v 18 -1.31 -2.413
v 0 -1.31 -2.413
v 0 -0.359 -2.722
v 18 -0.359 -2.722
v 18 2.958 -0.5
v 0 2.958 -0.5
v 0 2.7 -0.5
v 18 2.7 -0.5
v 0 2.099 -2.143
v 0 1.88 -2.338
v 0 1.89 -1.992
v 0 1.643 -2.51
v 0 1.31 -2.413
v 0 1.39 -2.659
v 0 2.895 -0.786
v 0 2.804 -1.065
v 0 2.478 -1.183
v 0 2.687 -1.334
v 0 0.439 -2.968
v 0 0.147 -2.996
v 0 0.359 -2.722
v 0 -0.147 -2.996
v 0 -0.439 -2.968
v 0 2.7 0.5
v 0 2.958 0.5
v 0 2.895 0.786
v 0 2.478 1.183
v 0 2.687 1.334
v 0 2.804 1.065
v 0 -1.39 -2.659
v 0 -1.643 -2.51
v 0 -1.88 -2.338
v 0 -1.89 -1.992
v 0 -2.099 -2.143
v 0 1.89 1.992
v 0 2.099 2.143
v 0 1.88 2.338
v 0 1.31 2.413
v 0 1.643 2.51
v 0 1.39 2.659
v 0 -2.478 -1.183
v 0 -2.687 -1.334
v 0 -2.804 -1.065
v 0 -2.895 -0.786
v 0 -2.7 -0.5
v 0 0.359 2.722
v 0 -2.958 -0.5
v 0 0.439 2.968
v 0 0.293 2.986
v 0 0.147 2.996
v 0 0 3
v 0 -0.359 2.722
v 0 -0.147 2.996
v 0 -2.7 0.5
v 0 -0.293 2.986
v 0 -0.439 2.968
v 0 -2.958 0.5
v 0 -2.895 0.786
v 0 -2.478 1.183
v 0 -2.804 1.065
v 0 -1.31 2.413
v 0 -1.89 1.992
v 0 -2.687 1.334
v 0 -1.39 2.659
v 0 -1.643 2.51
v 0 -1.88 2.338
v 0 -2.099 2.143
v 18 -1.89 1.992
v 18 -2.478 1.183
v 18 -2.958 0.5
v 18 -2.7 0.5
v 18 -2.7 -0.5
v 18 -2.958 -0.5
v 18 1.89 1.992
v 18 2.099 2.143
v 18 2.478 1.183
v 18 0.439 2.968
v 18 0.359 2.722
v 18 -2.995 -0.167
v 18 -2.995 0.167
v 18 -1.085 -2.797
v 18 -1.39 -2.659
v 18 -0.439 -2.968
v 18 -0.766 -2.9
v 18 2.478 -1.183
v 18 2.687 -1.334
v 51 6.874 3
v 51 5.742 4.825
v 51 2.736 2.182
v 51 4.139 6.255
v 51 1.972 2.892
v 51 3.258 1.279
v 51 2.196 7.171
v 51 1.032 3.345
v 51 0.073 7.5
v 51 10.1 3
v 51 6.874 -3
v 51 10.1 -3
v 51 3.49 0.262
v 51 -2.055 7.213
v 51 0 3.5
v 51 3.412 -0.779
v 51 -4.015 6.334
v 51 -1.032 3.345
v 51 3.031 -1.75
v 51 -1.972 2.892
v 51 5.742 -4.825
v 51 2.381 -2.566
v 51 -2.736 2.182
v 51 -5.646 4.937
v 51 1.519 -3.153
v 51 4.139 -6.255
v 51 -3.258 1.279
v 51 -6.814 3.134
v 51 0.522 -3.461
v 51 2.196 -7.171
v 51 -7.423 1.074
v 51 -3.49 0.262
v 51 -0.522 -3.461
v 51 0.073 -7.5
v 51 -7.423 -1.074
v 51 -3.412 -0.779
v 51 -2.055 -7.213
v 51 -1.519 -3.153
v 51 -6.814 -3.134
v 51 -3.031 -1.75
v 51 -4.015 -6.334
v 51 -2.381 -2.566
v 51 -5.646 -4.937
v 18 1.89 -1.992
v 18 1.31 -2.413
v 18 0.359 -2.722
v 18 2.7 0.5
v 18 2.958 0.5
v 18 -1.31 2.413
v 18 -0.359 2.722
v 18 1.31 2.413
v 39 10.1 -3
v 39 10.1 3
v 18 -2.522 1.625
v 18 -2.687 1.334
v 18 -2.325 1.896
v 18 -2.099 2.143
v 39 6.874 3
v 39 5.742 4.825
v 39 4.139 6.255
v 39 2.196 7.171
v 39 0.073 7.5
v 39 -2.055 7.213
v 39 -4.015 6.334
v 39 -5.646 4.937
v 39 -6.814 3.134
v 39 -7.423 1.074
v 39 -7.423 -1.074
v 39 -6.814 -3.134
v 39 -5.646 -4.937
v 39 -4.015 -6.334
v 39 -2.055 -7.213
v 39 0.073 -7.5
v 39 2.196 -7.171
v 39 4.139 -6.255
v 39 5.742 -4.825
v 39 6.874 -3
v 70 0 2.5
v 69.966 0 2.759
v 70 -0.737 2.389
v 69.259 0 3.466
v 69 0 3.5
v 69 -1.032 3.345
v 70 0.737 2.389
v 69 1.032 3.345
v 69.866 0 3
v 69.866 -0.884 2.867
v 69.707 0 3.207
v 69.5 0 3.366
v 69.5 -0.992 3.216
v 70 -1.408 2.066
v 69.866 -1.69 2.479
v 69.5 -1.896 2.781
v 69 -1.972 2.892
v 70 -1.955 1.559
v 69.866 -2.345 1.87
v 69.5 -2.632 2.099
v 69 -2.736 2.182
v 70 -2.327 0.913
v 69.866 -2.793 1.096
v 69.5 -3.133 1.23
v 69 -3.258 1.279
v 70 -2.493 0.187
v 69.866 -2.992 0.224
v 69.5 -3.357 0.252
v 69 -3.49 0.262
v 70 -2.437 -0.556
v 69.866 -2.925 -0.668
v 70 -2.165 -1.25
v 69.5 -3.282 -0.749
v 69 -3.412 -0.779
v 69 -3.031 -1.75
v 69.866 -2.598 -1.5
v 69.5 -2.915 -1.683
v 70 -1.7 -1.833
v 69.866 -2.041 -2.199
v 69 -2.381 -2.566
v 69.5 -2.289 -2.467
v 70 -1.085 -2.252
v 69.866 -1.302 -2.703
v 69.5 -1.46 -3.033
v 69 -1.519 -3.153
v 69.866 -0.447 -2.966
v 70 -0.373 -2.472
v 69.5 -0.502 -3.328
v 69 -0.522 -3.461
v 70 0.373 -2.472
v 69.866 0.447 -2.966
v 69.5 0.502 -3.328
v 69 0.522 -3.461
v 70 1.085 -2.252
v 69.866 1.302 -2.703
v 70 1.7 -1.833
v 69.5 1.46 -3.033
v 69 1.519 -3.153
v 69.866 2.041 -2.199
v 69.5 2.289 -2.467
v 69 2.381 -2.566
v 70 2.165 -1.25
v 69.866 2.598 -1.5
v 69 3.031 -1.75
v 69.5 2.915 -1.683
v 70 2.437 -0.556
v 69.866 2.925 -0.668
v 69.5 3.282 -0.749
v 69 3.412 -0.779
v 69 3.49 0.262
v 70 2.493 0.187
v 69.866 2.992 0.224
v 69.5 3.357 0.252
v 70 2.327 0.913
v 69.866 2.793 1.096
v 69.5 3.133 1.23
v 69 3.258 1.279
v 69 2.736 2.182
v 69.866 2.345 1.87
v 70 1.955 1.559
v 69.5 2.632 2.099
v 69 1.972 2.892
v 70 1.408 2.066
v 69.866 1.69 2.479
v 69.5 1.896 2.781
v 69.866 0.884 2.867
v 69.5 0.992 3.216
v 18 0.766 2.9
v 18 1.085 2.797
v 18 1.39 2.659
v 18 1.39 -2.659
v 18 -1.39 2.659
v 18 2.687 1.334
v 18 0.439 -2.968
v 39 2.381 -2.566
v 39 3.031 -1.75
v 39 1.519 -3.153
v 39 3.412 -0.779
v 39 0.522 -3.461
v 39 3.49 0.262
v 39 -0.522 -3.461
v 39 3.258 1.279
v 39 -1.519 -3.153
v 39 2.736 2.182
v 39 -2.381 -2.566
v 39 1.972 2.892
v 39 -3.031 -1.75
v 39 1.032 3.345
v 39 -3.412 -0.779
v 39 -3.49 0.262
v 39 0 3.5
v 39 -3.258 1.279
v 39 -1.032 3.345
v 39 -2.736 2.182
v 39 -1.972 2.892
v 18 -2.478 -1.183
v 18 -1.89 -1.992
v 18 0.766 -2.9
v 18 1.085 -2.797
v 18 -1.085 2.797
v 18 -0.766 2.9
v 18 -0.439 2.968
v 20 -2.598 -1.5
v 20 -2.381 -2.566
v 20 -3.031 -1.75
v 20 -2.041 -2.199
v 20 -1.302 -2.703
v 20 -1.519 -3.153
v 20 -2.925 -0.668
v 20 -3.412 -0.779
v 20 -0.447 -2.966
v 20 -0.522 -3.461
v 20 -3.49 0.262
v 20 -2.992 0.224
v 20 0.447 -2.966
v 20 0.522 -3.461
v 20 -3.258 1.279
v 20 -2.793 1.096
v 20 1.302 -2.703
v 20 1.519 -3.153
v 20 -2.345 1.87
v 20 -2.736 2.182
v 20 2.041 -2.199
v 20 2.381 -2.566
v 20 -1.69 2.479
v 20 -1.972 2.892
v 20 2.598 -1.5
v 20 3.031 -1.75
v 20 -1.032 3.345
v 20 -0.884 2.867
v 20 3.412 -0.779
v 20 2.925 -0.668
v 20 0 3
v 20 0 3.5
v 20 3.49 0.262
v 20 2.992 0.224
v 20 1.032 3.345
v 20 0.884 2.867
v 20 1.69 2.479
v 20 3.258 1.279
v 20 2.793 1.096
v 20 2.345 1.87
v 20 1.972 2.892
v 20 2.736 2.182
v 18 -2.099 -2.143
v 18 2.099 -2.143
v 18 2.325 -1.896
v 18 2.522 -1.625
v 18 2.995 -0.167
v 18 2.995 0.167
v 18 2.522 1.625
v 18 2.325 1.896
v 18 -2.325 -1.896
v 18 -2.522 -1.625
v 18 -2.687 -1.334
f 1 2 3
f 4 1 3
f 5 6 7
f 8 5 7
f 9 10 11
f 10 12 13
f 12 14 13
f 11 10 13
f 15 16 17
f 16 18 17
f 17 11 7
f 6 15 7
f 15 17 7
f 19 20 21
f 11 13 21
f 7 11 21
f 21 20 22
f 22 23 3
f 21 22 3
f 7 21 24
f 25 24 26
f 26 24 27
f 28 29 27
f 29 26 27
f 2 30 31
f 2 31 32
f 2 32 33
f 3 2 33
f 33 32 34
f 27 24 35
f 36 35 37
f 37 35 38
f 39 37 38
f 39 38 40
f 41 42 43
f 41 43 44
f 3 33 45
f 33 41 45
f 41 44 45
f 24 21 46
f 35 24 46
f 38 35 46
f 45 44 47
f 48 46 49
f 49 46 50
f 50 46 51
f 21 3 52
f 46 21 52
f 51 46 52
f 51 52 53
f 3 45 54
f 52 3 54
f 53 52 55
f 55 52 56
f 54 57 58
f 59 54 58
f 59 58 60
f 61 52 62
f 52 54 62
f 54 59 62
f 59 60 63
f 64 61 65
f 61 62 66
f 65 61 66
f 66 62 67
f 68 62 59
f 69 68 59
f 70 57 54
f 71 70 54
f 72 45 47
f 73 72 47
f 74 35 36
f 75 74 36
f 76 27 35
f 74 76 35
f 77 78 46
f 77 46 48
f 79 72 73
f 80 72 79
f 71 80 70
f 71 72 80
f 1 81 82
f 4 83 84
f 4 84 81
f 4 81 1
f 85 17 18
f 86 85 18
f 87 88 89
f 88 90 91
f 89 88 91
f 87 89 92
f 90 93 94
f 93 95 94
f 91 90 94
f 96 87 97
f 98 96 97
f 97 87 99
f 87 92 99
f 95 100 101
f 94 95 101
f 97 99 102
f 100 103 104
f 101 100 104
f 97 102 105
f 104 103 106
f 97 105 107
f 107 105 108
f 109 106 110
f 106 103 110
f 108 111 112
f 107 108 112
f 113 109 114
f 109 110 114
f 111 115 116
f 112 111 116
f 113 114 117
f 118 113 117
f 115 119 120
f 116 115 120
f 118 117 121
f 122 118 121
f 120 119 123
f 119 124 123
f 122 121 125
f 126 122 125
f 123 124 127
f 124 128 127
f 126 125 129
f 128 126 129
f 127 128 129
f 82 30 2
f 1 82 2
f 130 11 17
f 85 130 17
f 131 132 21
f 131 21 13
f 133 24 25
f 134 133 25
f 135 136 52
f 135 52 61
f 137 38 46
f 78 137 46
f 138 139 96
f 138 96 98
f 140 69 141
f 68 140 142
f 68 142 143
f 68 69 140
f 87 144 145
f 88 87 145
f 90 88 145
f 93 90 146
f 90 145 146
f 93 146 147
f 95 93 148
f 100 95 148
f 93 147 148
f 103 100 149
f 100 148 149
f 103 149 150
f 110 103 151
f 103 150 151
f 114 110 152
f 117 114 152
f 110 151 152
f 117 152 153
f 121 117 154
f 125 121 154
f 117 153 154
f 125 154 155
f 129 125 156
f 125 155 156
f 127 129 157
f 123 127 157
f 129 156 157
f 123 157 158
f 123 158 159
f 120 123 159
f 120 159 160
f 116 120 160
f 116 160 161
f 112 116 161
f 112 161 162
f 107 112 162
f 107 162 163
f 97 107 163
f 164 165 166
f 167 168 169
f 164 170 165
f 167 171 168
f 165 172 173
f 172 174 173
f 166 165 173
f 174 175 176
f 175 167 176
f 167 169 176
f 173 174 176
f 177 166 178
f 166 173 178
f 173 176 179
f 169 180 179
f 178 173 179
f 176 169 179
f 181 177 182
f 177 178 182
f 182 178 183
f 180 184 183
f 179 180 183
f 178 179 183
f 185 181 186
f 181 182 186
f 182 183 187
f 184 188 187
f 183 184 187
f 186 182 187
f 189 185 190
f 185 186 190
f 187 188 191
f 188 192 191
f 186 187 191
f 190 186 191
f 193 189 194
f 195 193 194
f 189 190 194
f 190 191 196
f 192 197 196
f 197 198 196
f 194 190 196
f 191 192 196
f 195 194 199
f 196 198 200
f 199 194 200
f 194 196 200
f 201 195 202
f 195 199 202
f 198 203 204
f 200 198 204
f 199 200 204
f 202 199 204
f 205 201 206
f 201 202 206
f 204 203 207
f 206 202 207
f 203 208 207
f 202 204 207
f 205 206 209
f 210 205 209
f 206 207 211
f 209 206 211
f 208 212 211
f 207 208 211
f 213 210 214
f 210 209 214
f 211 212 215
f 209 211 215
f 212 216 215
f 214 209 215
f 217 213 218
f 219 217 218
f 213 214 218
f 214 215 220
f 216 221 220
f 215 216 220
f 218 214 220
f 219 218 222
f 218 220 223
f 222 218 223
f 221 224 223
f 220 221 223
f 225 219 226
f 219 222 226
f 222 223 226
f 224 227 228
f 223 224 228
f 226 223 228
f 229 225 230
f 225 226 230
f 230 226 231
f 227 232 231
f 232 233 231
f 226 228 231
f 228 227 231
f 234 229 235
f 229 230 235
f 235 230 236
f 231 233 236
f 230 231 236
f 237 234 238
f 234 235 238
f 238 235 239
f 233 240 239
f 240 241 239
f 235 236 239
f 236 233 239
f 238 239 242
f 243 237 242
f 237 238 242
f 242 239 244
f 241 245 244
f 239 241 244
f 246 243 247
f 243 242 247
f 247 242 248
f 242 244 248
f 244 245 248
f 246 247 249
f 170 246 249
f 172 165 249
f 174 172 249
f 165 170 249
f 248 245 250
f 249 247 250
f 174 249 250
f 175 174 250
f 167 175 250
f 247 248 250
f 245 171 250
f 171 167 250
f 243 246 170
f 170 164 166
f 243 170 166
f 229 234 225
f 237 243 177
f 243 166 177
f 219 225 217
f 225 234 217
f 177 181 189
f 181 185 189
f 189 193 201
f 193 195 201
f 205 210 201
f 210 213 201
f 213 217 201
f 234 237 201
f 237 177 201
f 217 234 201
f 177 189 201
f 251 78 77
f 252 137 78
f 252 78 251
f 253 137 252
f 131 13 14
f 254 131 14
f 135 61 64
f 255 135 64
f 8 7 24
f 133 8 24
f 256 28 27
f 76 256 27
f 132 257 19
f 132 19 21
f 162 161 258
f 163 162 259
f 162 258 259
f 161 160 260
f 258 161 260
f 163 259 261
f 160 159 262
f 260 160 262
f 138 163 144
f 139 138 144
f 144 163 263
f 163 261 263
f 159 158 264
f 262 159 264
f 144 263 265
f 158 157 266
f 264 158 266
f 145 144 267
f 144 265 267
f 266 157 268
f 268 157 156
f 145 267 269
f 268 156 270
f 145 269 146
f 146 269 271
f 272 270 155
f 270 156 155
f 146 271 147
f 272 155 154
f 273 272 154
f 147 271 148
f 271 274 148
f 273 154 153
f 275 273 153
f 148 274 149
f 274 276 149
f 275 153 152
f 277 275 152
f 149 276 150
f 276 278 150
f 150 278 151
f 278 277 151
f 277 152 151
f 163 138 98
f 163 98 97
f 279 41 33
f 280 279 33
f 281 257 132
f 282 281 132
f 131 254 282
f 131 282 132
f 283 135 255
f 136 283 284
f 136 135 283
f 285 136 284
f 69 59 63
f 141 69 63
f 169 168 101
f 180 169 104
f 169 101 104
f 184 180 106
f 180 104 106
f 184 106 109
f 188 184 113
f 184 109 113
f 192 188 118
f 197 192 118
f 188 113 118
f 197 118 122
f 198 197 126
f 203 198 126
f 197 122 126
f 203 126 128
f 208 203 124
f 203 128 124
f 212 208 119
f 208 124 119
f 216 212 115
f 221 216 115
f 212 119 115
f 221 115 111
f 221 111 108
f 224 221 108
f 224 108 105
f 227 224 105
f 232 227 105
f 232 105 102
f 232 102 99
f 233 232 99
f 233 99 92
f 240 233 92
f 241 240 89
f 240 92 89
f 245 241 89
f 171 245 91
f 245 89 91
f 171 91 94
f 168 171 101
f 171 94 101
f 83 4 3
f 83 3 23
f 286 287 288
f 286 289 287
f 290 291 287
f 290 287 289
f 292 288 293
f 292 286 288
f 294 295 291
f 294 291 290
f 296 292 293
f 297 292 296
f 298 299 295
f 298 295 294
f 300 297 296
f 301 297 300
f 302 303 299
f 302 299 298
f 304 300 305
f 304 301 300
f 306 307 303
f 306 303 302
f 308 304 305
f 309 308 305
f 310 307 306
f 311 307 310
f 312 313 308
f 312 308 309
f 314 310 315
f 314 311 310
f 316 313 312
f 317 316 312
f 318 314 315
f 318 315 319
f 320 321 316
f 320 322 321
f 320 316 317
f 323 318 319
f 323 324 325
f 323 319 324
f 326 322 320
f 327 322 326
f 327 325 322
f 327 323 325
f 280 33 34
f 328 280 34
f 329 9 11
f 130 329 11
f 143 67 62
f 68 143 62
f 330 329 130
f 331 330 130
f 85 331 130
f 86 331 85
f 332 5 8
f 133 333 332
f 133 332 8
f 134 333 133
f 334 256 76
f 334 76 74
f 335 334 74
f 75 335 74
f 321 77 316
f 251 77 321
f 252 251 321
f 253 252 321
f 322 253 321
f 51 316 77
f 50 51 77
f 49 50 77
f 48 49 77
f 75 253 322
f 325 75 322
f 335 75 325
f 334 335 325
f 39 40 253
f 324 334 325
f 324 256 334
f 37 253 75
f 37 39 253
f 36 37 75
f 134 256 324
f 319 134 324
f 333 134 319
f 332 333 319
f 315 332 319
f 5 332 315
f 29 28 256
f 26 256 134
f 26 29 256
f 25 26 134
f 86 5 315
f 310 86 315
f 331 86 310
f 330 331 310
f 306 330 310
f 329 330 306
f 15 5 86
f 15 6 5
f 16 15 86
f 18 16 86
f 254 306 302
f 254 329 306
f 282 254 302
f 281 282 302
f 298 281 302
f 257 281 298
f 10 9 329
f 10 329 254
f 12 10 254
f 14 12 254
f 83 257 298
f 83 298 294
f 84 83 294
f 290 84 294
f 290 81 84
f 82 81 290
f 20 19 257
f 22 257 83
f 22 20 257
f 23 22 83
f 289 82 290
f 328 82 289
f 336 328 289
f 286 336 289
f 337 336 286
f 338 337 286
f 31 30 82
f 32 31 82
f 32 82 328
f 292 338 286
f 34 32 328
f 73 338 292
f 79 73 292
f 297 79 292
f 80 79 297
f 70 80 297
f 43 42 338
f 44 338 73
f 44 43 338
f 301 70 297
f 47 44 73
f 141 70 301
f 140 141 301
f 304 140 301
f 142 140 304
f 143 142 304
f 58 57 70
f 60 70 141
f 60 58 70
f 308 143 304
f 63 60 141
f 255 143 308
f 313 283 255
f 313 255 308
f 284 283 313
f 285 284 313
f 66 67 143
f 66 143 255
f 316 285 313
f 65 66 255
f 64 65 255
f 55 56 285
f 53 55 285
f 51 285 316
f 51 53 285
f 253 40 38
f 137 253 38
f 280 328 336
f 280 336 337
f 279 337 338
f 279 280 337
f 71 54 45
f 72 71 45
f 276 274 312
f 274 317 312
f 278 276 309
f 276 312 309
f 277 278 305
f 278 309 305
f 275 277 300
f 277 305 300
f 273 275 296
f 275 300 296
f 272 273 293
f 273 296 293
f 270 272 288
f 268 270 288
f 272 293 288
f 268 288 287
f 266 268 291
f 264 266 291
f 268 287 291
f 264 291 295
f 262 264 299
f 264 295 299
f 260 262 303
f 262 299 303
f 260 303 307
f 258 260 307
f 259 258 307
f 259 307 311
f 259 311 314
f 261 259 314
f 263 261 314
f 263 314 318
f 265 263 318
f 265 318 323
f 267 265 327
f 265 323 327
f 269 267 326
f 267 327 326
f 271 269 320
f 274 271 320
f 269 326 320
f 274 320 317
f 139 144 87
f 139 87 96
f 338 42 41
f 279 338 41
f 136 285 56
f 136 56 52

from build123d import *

# Parameters (mm, degrees)
Y_KSEKLIK_EKSTR_ZYON2_START = -12
Y_KSEKLIK_EKSTR_ZYON2_DEPTH = 12
KES_EKSTR_ZYON1_DEPTH       = 18
IZIM4_R                     = 3.5
IZIM4_R_2                   = 3
KES_EKSTR_ZYON2_DEPTH       = 20


with BuildPart() as part:
    # Çizim1 → Döndür1 (revolve)
    with BuildSketch(Plane.XY, mode=Mode.PRIVATE) as d_nd_r1_sk:
        with BuildLine():
            Line((0, 0), (70, 0))
            Line((70, 0), (70, 2.5))
            ThreePointArc((70, 2.5), (69.707106781, 3.207106781), (69, 3.5))
            Line((69, 3.5), (51, 3.5))
            Line((51, 3.5), (51, 7.5))
            Line((51, 7.5), (39, 7.5))
            Line((39, 7.5), (39, 3.5))
            Line((39, 3.5), (0, 3.5))
            Line((0, 3.5), (0, 0))
        make_face()
    revolve(d_nd_r1_sk.sketch.rotate(Axis((0, 0, 0), (1, 0, 0)), 90), axis=Axis((0, 0, 0), (1, 0, 0)))

    # Çizim2 → Yükseklik-Ekstrüzyon2 (add)
    with BuildSketch(Plane(origin=(51, 0, 0), x_dir=(0, 0, -1), z_dir=(1, 0, 0)).offset(Y_KSEKLIK_EKSTR_ZYON2_START)):
        with BuildLine():
            Line((-3, 10.1), (3, 10.1))
            Line((3, 10.1), (3, 6.873863542))
            ThreePointArc((3, 6.873863542), (0, 7.5), (-3, 6.873863542))
            Line((-3, 6.873863542), (-3, 10.1))
        make_face()
    extrude(amount=Y_KSEKLIK_EKSTR_ZYON2_DEPTH)

    # Çizim3 → Kes-Ekstrüzyon1 (cut)
    with BuildSketch(Plane.ZY):
        with BuildLine():
            Line((1.182511684, 2.478238511), (1.991528678, 1.890453259))
            Line((1.991528678, 1.890453259), (2.440656339, 2.508624451))
            ThreePointArc((2.440656339, 2.508624451), (2.057248383, 2.83155948), (1.631639345, 3.096409703))
            Line((1.631639345, 3.096409703), (1.182511684, 2.478238511))
        make_face()
        with BuildLine():
            Line((-0.5, 3.464101615), (-0.5, 2.7))
            Line((-0.5, 2.7), (0.5, 2.7))
            Line((0.5, 2.7), (0.5, 3.464101615))
            ThreePointArc((0.5, 3.464101615), (0, 3.5), (-0.5, 3.464101615))
        make_face()
        with BuildLine():
            Line((2.413344097, 1.309874143), (2.722361091, 0.358817627))
            Line((2.722361091, 0.358817627), (3.449064911, 0.594938011))
            ThreePointArc((3.449064911, 0.594938011), (3.328697807, 1.08155948), (3.140047917, 1.545994527))
            Line((3.140047917, 1.545994527), (2.413344097, 1.309874143))
        make_face()
        with BuildLine():
            Line((2.722361091, -0.358817627), (2.413344097, -1.309874143))
            Line((2.413344097, -1.309874143), (3.140047917, -1.545994527))
            ThreePointArc((3.140047917, -1.545994527), (3.328697807, -1.08155948), (3.449064911, -0.594938011))
            Line((3.449064911, -0.594938011), (2.722361091, -0.358817627))
        make_face()
        with BuildLine():
            Line((1.991528678, -1.890453259), (1.182511684, -2.478238511))
            Line((1.182511684, -2.478238511), (1.631639345, -3.096409703))
            ThreePointArc((1.631639345, -3.096409703), (2.057248383, -2.83155948), (2.440656339, -2.508624451))
            Line((2.440656339, -2.508624451), (1.991528678, -1.890453259))
        make_face()
        with BuildLine():
            Line((0.5, -2.7), (-0.5, -2.7))
            Line((-0.5, -2.7), (-0.5, -3.464101615))
            ThreePointArc((-0.5, -3.464101615), (0, -3.5), (0.5, -3.464101615))
            Line((0.5, -3.464101615), (0.5, -2.7))
        make_face()
        with BuildLine():
            Line((-1.182511684, -2.478238511), (-1.991528678, -1.890453259))
            Line((-1.991528678, -1.890453259), (-2.440656339, -2.508624451))
            ThreePointArc((-2.440656339, -2.508624451), (-2.057248383, -2.83155948), (-1.631639345, -3.096409703))
            Line((-1.631639345, -3.096409703), (-1.182511684, -2.478238511))
        make_face()
        with BuildLine():
            Line((-2.413344097, -1.309874143), (-2.722361091, -0.358817627))
            Line((-2.722361091, -0.358817627), (-3.449064911, -0.594938011))
            ThreePointArc((-3.449064911, -0.594938011), (-3.328697807, -1.08155948), (-3.140047917, -1.545994527))
            Line((-3.140047917, -1.545994527), (-2.413344097, -1.309874143))
        make_face()
        with BuildLine():
            Line((-2.722361091, 0.358817627), (-2.413344097, 1.309874143))
            Line((-2.413344097, 1.309874143), (-3.140047917, 1.545994527))
            ThreePointArc((-3.140047917, 1.545994527), (-3.328697807, 1.08155948), (-3.449064911, 0.594938011))
            Line((-3.449064911, 0.594938011), (-2.722361091, 0.358817627))
        make_face()
        with BuildLine():
            Line((-1.991528678, 1.890453259), (-1.182511684, 2.478238511))
            Line((-1.182511684, 2.478238511), (-1.631639345, 3.096409703))
            ThreePointArc((-1.631639345, 3.096409703), (-2.057248383, 2.83155948), (-2.440656339, 2.508624451))
            Line((-2.440656339, 2.508624451), (-1.991528678, 1.890453259))
        make_face()
    extrude(amount=-KES_EKSTR_ZYON1_DEPTH, mode=Mode.SUBTRACT)

    # Çizim4 → Kes-Ekstrüzyon2 (cut)
    with BuildSketch(Plane.ZY):
        Circle(IZIM4_R)
        Circle(IZIM4_R_2, mode=Mode.SUBTRACT)
    extrude(amount=-KES_EKSTR_ZYON2_DEPTH, mode=Mode.SUBTRACT)


solid = part.part
